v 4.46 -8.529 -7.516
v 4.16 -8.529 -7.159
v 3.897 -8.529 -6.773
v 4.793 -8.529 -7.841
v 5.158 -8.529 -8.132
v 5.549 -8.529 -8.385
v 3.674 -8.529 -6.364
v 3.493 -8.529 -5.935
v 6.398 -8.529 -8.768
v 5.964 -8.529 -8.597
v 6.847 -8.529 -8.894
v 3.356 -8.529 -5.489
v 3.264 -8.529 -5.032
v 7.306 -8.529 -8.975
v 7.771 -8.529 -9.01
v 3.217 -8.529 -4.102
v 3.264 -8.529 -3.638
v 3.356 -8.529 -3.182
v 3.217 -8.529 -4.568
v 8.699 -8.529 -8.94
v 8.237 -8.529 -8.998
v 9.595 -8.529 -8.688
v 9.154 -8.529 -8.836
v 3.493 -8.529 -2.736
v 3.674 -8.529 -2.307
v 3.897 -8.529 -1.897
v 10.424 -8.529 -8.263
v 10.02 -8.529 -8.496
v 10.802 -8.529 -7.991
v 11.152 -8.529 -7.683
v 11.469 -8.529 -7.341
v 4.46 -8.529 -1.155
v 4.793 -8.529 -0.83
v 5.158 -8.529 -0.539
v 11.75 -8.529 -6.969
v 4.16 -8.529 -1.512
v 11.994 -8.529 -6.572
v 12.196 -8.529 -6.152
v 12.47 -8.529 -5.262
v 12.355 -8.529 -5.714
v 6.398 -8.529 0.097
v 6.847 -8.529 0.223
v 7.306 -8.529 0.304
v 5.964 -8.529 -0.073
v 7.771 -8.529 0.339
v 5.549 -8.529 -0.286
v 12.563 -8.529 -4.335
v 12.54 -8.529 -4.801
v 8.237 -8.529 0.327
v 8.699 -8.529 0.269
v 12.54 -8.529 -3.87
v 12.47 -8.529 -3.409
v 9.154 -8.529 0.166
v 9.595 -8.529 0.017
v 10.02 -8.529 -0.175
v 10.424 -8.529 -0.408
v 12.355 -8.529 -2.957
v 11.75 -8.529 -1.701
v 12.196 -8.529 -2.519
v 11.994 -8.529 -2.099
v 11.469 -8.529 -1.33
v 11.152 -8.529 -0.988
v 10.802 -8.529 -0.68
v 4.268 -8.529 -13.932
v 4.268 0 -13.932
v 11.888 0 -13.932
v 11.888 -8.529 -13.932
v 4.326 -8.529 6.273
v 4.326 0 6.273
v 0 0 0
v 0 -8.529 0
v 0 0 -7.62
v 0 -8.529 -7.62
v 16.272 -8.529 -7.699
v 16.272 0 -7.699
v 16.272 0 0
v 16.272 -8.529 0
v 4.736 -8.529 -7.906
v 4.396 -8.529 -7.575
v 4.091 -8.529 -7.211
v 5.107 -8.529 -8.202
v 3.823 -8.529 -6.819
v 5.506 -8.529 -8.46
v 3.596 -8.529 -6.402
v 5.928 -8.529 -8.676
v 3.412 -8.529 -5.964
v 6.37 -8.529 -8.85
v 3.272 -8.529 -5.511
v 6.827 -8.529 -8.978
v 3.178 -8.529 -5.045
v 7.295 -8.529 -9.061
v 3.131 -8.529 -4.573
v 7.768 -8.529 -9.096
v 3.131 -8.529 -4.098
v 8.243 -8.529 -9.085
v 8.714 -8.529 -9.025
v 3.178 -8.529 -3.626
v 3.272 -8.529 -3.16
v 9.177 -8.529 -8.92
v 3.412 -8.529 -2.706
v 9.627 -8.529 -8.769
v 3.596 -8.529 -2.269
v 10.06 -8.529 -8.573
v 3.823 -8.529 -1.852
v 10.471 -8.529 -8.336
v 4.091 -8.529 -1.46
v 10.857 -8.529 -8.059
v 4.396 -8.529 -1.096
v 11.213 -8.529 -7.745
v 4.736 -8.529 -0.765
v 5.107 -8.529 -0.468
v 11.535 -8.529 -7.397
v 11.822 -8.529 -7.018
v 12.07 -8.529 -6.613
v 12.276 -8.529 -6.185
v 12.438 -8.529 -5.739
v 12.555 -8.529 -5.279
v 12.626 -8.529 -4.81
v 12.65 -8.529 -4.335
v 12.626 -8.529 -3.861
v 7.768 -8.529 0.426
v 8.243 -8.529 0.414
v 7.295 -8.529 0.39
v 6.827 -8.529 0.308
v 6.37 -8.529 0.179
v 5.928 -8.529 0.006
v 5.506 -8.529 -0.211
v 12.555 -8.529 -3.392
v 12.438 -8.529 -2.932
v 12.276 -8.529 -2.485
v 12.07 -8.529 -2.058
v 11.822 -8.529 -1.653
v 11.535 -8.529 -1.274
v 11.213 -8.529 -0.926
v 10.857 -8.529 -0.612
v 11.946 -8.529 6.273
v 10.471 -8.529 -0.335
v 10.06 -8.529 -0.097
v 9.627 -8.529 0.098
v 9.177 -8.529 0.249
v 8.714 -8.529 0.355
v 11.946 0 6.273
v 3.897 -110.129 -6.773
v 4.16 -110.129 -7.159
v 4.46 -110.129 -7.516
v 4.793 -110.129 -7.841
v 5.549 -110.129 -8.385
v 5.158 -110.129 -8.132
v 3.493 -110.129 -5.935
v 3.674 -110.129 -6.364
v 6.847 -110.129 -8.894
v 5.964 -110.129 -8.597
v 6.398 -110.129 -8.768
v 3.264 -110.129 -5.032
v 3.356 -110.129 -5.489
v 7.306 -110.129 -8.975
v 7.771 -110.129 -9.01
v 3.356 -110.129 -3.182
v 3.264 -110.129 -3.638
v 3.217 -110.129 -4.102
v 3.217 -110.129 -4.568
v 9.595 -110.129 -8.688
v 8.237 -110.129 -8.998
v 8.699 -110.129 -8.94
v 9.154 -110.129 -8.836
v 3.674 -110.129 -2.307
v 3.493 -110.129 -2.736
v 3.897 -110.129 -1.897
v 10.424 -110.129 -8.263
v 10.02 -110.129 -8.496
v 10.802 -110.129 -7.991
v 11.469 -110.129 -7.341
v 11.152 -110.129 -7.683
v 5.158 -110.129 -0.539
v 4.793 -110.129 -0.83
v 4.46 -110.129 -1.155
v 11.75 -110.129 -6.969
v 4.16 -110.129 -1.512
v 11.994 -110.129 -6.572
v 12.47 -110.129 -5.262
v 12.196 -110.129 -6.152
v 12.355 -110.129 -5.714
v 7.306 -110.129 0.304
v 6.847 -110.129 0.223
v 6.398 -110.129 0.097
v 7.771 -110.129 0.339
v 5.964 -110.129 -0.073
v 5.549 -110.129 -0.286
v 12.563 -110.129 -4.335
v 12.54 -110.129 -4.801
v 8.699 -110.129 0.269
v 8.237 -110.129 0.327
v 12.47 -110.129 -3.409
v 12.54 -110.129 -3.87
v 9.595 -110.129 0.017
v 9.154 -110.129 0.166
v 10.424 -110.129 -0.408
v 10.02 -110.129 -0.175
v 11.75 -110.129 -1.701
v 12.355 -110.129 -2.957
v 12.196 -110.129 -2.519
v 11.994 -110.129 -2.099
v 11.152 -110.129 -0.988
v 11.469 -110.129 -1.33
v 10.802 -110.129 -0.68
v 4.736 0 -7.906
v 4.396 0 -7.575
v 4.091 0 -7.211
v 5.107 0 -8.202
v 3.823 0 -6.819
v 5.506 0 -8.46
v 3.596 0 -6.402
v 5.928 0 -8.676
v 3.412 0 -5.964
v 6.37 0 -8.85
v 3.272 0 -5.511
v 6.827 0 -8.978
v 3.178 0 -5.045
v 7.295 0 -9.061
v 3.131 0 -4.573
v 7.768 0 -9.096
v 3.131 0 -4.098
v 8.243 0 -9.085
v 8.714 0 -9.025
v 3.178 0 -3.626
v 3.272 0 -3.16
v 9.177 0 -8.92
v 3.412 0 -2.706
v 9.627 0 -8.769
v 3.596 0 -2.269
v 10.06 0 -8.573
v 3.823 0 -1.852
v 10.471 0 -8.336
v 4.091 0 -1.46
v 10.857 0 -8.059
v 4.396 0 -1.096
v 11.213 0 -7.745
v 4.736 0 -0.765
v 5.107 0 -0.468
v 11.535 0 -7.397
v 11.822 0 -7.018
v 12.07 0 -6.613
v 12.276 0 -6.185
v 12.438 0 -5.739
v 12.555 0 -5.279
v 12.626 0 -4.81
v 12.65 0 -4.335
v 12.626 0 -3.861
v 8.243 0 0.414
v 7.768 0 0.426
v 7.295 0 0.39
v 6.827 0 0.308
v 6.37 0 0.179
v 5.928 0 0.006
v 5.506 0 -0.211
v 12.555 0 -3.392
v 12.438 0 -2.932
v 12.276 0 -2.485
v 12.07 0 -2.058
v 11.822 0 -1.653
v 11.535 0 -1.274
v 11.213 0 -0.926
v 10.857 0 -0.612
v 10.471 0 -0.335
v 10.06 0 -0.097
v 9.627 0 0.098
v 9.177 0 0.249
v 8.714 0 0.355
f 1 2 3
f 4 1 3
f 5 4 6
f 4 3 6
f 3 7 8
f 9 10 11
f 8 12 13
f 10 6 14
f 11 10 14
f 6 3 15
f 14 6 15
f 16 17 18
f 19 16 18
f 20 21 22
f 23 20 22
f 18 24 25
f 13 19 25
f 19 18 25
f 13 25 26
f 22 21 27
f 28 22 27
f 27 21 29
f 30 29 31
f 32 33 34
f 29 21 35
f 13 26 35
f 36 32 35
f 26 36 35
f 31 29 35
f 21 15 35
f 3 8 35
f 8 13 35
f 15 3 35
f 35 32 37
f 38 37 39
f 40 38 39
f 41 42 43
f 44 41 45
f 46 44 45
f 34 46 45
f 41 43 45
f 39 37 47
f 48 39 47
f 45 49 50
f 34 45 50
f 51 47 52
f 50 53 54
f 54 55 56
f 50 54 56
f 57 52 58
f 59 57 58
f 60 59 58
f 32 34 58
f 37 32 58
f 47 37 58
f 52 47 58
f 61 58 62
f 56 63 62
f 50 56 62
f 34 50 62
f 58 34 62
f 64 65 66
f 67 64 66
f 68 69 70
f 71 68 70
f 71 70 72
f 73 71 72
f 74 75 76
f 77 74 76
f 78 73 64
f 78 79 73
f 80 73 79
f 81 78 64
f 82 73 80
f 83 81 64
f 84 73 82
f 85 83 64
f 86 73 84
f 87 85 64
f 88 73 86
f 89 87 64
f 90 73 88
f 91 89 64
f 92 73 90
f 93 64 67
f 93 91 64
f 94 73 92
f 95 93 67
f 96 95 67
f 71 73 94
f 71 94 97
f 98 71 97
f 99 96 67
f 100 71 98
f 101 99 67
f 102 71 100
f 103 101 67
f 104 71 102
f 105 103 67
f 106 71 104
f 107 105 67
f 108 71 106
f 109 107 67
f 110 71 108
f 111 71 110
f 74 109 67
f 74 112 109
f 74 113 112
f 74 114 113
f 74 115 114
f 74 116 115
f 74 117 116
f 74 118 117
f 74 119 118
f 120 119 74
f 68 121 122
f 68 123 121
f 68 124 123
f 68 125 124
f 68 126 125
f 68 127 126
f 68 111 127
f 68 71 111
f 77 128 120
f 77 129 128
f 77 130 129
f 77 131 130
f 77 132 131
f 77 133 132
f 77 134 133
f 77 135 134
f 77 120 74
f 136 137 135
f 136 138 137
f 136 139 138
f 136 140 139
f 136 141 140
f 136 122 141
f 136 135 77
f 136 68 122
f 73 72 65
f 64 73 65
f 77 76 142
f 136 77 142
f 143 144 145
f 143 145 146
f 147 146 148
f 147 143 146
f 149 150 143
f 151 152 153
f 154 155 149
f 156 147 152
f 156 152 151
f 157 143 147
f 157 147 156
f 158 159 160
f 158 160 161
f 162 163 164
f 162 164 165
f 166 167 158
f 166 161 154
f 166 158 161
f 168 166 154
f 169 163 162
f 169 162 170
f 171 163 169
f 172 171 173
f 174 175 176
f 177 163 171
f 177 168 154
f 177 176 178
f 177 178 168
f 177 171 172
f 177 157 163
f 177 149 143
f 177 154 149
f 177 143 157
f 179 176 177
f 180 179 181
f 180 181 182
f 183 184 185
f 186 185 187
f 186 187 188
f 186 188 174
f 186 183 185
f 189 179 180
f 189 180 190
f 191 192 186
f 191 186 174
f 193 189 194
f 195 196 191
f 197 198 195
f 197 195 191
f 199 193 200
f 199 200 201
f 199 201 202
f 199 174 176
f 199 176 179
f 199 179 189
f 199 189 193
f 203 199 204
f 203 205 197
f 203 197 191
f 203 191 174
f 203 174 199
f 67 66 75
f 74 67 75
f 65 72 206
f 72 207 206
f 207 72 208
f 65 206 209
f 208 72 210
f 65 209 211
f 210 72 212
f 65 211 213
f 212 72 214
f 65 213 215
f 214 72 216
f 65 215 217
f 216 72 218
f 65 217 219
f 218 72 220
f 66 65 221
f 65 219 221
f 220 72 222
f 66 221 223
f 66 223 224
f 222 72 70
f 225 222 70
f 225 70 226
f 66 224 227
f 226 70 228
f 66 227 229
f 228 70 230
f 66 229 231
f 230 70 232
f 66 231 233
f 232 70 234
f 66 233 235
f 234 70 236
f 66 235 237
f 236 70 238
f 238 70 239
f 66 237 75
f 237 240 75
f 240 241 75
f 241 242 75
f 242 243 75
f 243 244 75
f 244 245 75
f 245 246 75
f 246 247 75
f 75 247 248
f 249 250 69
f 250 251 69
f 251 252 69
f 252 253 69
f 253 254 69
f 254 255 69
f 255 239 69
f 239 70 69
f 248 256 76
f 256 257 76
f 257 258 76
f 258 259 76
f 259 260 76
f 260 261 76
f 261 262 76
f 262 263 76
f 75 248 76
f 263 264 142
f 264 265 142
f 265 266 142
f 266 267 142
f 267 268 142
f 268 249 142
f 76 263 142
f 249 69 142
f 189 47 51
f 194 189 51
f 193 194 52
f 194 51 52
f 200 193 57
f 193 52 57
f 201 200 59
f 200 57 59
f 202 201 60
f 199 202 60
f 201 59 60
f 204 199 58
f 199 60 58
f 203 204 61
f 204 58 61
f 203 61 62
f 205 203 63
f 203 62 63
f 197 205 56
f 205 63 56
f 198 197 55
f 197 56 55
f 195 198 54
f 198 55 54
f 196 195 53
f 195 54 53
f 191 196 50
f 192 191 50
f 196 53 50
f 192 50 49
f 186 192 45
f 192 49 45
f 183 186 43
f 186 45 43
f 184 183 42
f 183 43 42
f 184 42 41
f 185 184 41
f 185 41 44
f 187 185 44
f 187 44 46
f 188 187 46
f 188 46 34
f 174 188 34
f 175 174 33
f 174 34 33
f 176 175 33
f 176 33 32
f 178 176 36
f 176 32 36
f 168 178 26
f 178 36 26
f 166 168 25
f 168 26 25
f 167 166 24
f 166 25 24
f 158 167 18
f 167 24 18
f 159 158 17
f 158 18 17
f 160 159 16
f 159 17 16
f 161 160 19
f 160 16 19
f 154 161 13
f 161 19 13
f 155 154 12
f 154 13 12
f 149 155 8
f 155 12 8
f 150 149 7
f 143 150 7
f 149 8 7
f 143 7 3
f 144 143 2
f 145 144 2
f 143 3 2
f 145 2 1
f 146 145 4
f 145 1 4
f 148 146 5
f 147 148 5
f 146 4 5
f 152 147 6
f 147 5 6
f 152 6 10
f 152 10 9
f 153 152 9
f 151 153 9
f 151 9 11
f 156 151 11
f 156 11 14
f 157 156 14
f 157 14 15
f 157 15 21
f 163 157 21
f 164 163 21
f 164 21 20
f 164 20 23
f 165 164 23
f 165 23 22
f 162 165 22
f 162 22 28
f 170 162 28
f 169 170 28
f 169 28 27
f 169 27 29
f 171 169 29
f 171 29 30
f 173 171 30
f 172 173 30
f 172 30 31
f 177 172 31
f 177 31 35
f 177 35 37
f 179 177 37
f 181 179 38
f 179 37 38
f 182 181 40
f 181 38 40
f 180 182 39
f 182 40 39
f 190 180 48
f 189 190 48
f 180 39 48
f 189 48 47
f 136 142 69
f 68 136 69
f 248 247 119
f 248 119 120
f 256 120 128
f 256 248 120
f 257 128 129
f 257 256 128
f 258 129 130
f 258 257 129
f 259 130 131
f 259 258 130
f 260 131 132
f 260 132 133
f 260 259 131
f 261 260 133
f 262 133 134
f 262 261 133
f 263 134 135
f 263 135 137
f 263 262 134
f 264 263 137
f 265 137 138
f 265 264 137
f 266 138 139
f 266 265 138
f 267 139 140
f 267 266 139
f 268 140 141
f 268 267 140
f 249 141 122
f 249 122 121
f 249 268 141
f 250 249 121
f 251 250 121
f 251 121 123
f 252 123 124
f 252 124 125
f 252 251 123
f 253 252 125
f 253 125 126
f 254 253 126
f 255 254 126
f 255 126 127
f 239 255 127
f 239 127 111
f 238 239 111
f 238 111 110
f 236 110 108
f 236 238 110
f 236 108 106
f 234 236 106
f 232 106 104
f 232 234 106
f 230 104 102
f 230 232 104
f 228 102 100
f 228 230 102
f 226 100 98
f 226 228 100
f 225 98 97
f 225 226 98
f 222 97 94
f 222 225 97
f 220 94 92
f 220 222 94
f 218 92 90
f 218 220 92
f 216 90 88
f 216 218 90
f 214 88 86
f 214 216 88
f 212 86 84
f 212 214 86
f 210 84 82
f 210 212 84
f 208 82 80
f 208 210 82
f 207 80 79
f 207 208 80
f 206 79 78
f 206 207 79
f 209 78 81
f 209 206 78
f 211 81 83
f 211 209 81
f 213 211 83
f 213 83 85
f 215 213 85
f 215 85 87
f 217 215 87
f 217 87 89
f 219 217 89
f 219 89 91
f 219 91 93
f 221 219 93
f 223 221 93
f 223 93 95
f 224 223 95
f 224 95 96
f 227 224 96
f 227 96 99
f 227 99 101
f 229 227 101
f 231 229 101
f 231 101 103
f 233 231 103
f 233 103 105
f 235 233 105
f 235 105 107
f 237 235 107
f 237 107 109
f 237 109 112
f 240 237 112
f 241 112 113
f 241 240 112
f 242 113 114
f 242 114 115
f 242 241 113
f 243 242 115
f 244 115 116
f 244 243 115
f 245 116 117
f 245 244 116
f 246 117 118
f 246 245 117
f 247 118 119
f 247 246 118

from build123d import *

# Parameters (mm, degrees)
F0_R     = 4.7625
F1_DEPTH = 8.528801
F2_R     = 4.675782
F3_DEPTH = 101.6


with BuildPart() as f1:
    # F0 (on Front) → F1 (new body)
    with BuildSketch(Plane.XZ):
        Polygon((4.325996, 6.272971), (0, 0), (0, -7.62), (4.268434, -13.93228), (11.888434, -13.93228), (16.271991, -7.699397), (16.271991, 0), (11.945996, 6.272971), align=None)
        with Locations((7.887162, -4.335348)):
            Circle(F0_R, mode=Mode.SUBTRACT)
    extrude(amount=F1_DEPTH)


with BuildPart() as f3:
    # F2 (on face) → F3 (new body)
    with BuildSketch(Plane.XZ.offset(8.528801)):
        with Locations((7.887162, -4.335348)):
            Circle(F2_R)
    extrude(amount=F3_DEPTH)


solid = Compound([f1.part, f3.part])
